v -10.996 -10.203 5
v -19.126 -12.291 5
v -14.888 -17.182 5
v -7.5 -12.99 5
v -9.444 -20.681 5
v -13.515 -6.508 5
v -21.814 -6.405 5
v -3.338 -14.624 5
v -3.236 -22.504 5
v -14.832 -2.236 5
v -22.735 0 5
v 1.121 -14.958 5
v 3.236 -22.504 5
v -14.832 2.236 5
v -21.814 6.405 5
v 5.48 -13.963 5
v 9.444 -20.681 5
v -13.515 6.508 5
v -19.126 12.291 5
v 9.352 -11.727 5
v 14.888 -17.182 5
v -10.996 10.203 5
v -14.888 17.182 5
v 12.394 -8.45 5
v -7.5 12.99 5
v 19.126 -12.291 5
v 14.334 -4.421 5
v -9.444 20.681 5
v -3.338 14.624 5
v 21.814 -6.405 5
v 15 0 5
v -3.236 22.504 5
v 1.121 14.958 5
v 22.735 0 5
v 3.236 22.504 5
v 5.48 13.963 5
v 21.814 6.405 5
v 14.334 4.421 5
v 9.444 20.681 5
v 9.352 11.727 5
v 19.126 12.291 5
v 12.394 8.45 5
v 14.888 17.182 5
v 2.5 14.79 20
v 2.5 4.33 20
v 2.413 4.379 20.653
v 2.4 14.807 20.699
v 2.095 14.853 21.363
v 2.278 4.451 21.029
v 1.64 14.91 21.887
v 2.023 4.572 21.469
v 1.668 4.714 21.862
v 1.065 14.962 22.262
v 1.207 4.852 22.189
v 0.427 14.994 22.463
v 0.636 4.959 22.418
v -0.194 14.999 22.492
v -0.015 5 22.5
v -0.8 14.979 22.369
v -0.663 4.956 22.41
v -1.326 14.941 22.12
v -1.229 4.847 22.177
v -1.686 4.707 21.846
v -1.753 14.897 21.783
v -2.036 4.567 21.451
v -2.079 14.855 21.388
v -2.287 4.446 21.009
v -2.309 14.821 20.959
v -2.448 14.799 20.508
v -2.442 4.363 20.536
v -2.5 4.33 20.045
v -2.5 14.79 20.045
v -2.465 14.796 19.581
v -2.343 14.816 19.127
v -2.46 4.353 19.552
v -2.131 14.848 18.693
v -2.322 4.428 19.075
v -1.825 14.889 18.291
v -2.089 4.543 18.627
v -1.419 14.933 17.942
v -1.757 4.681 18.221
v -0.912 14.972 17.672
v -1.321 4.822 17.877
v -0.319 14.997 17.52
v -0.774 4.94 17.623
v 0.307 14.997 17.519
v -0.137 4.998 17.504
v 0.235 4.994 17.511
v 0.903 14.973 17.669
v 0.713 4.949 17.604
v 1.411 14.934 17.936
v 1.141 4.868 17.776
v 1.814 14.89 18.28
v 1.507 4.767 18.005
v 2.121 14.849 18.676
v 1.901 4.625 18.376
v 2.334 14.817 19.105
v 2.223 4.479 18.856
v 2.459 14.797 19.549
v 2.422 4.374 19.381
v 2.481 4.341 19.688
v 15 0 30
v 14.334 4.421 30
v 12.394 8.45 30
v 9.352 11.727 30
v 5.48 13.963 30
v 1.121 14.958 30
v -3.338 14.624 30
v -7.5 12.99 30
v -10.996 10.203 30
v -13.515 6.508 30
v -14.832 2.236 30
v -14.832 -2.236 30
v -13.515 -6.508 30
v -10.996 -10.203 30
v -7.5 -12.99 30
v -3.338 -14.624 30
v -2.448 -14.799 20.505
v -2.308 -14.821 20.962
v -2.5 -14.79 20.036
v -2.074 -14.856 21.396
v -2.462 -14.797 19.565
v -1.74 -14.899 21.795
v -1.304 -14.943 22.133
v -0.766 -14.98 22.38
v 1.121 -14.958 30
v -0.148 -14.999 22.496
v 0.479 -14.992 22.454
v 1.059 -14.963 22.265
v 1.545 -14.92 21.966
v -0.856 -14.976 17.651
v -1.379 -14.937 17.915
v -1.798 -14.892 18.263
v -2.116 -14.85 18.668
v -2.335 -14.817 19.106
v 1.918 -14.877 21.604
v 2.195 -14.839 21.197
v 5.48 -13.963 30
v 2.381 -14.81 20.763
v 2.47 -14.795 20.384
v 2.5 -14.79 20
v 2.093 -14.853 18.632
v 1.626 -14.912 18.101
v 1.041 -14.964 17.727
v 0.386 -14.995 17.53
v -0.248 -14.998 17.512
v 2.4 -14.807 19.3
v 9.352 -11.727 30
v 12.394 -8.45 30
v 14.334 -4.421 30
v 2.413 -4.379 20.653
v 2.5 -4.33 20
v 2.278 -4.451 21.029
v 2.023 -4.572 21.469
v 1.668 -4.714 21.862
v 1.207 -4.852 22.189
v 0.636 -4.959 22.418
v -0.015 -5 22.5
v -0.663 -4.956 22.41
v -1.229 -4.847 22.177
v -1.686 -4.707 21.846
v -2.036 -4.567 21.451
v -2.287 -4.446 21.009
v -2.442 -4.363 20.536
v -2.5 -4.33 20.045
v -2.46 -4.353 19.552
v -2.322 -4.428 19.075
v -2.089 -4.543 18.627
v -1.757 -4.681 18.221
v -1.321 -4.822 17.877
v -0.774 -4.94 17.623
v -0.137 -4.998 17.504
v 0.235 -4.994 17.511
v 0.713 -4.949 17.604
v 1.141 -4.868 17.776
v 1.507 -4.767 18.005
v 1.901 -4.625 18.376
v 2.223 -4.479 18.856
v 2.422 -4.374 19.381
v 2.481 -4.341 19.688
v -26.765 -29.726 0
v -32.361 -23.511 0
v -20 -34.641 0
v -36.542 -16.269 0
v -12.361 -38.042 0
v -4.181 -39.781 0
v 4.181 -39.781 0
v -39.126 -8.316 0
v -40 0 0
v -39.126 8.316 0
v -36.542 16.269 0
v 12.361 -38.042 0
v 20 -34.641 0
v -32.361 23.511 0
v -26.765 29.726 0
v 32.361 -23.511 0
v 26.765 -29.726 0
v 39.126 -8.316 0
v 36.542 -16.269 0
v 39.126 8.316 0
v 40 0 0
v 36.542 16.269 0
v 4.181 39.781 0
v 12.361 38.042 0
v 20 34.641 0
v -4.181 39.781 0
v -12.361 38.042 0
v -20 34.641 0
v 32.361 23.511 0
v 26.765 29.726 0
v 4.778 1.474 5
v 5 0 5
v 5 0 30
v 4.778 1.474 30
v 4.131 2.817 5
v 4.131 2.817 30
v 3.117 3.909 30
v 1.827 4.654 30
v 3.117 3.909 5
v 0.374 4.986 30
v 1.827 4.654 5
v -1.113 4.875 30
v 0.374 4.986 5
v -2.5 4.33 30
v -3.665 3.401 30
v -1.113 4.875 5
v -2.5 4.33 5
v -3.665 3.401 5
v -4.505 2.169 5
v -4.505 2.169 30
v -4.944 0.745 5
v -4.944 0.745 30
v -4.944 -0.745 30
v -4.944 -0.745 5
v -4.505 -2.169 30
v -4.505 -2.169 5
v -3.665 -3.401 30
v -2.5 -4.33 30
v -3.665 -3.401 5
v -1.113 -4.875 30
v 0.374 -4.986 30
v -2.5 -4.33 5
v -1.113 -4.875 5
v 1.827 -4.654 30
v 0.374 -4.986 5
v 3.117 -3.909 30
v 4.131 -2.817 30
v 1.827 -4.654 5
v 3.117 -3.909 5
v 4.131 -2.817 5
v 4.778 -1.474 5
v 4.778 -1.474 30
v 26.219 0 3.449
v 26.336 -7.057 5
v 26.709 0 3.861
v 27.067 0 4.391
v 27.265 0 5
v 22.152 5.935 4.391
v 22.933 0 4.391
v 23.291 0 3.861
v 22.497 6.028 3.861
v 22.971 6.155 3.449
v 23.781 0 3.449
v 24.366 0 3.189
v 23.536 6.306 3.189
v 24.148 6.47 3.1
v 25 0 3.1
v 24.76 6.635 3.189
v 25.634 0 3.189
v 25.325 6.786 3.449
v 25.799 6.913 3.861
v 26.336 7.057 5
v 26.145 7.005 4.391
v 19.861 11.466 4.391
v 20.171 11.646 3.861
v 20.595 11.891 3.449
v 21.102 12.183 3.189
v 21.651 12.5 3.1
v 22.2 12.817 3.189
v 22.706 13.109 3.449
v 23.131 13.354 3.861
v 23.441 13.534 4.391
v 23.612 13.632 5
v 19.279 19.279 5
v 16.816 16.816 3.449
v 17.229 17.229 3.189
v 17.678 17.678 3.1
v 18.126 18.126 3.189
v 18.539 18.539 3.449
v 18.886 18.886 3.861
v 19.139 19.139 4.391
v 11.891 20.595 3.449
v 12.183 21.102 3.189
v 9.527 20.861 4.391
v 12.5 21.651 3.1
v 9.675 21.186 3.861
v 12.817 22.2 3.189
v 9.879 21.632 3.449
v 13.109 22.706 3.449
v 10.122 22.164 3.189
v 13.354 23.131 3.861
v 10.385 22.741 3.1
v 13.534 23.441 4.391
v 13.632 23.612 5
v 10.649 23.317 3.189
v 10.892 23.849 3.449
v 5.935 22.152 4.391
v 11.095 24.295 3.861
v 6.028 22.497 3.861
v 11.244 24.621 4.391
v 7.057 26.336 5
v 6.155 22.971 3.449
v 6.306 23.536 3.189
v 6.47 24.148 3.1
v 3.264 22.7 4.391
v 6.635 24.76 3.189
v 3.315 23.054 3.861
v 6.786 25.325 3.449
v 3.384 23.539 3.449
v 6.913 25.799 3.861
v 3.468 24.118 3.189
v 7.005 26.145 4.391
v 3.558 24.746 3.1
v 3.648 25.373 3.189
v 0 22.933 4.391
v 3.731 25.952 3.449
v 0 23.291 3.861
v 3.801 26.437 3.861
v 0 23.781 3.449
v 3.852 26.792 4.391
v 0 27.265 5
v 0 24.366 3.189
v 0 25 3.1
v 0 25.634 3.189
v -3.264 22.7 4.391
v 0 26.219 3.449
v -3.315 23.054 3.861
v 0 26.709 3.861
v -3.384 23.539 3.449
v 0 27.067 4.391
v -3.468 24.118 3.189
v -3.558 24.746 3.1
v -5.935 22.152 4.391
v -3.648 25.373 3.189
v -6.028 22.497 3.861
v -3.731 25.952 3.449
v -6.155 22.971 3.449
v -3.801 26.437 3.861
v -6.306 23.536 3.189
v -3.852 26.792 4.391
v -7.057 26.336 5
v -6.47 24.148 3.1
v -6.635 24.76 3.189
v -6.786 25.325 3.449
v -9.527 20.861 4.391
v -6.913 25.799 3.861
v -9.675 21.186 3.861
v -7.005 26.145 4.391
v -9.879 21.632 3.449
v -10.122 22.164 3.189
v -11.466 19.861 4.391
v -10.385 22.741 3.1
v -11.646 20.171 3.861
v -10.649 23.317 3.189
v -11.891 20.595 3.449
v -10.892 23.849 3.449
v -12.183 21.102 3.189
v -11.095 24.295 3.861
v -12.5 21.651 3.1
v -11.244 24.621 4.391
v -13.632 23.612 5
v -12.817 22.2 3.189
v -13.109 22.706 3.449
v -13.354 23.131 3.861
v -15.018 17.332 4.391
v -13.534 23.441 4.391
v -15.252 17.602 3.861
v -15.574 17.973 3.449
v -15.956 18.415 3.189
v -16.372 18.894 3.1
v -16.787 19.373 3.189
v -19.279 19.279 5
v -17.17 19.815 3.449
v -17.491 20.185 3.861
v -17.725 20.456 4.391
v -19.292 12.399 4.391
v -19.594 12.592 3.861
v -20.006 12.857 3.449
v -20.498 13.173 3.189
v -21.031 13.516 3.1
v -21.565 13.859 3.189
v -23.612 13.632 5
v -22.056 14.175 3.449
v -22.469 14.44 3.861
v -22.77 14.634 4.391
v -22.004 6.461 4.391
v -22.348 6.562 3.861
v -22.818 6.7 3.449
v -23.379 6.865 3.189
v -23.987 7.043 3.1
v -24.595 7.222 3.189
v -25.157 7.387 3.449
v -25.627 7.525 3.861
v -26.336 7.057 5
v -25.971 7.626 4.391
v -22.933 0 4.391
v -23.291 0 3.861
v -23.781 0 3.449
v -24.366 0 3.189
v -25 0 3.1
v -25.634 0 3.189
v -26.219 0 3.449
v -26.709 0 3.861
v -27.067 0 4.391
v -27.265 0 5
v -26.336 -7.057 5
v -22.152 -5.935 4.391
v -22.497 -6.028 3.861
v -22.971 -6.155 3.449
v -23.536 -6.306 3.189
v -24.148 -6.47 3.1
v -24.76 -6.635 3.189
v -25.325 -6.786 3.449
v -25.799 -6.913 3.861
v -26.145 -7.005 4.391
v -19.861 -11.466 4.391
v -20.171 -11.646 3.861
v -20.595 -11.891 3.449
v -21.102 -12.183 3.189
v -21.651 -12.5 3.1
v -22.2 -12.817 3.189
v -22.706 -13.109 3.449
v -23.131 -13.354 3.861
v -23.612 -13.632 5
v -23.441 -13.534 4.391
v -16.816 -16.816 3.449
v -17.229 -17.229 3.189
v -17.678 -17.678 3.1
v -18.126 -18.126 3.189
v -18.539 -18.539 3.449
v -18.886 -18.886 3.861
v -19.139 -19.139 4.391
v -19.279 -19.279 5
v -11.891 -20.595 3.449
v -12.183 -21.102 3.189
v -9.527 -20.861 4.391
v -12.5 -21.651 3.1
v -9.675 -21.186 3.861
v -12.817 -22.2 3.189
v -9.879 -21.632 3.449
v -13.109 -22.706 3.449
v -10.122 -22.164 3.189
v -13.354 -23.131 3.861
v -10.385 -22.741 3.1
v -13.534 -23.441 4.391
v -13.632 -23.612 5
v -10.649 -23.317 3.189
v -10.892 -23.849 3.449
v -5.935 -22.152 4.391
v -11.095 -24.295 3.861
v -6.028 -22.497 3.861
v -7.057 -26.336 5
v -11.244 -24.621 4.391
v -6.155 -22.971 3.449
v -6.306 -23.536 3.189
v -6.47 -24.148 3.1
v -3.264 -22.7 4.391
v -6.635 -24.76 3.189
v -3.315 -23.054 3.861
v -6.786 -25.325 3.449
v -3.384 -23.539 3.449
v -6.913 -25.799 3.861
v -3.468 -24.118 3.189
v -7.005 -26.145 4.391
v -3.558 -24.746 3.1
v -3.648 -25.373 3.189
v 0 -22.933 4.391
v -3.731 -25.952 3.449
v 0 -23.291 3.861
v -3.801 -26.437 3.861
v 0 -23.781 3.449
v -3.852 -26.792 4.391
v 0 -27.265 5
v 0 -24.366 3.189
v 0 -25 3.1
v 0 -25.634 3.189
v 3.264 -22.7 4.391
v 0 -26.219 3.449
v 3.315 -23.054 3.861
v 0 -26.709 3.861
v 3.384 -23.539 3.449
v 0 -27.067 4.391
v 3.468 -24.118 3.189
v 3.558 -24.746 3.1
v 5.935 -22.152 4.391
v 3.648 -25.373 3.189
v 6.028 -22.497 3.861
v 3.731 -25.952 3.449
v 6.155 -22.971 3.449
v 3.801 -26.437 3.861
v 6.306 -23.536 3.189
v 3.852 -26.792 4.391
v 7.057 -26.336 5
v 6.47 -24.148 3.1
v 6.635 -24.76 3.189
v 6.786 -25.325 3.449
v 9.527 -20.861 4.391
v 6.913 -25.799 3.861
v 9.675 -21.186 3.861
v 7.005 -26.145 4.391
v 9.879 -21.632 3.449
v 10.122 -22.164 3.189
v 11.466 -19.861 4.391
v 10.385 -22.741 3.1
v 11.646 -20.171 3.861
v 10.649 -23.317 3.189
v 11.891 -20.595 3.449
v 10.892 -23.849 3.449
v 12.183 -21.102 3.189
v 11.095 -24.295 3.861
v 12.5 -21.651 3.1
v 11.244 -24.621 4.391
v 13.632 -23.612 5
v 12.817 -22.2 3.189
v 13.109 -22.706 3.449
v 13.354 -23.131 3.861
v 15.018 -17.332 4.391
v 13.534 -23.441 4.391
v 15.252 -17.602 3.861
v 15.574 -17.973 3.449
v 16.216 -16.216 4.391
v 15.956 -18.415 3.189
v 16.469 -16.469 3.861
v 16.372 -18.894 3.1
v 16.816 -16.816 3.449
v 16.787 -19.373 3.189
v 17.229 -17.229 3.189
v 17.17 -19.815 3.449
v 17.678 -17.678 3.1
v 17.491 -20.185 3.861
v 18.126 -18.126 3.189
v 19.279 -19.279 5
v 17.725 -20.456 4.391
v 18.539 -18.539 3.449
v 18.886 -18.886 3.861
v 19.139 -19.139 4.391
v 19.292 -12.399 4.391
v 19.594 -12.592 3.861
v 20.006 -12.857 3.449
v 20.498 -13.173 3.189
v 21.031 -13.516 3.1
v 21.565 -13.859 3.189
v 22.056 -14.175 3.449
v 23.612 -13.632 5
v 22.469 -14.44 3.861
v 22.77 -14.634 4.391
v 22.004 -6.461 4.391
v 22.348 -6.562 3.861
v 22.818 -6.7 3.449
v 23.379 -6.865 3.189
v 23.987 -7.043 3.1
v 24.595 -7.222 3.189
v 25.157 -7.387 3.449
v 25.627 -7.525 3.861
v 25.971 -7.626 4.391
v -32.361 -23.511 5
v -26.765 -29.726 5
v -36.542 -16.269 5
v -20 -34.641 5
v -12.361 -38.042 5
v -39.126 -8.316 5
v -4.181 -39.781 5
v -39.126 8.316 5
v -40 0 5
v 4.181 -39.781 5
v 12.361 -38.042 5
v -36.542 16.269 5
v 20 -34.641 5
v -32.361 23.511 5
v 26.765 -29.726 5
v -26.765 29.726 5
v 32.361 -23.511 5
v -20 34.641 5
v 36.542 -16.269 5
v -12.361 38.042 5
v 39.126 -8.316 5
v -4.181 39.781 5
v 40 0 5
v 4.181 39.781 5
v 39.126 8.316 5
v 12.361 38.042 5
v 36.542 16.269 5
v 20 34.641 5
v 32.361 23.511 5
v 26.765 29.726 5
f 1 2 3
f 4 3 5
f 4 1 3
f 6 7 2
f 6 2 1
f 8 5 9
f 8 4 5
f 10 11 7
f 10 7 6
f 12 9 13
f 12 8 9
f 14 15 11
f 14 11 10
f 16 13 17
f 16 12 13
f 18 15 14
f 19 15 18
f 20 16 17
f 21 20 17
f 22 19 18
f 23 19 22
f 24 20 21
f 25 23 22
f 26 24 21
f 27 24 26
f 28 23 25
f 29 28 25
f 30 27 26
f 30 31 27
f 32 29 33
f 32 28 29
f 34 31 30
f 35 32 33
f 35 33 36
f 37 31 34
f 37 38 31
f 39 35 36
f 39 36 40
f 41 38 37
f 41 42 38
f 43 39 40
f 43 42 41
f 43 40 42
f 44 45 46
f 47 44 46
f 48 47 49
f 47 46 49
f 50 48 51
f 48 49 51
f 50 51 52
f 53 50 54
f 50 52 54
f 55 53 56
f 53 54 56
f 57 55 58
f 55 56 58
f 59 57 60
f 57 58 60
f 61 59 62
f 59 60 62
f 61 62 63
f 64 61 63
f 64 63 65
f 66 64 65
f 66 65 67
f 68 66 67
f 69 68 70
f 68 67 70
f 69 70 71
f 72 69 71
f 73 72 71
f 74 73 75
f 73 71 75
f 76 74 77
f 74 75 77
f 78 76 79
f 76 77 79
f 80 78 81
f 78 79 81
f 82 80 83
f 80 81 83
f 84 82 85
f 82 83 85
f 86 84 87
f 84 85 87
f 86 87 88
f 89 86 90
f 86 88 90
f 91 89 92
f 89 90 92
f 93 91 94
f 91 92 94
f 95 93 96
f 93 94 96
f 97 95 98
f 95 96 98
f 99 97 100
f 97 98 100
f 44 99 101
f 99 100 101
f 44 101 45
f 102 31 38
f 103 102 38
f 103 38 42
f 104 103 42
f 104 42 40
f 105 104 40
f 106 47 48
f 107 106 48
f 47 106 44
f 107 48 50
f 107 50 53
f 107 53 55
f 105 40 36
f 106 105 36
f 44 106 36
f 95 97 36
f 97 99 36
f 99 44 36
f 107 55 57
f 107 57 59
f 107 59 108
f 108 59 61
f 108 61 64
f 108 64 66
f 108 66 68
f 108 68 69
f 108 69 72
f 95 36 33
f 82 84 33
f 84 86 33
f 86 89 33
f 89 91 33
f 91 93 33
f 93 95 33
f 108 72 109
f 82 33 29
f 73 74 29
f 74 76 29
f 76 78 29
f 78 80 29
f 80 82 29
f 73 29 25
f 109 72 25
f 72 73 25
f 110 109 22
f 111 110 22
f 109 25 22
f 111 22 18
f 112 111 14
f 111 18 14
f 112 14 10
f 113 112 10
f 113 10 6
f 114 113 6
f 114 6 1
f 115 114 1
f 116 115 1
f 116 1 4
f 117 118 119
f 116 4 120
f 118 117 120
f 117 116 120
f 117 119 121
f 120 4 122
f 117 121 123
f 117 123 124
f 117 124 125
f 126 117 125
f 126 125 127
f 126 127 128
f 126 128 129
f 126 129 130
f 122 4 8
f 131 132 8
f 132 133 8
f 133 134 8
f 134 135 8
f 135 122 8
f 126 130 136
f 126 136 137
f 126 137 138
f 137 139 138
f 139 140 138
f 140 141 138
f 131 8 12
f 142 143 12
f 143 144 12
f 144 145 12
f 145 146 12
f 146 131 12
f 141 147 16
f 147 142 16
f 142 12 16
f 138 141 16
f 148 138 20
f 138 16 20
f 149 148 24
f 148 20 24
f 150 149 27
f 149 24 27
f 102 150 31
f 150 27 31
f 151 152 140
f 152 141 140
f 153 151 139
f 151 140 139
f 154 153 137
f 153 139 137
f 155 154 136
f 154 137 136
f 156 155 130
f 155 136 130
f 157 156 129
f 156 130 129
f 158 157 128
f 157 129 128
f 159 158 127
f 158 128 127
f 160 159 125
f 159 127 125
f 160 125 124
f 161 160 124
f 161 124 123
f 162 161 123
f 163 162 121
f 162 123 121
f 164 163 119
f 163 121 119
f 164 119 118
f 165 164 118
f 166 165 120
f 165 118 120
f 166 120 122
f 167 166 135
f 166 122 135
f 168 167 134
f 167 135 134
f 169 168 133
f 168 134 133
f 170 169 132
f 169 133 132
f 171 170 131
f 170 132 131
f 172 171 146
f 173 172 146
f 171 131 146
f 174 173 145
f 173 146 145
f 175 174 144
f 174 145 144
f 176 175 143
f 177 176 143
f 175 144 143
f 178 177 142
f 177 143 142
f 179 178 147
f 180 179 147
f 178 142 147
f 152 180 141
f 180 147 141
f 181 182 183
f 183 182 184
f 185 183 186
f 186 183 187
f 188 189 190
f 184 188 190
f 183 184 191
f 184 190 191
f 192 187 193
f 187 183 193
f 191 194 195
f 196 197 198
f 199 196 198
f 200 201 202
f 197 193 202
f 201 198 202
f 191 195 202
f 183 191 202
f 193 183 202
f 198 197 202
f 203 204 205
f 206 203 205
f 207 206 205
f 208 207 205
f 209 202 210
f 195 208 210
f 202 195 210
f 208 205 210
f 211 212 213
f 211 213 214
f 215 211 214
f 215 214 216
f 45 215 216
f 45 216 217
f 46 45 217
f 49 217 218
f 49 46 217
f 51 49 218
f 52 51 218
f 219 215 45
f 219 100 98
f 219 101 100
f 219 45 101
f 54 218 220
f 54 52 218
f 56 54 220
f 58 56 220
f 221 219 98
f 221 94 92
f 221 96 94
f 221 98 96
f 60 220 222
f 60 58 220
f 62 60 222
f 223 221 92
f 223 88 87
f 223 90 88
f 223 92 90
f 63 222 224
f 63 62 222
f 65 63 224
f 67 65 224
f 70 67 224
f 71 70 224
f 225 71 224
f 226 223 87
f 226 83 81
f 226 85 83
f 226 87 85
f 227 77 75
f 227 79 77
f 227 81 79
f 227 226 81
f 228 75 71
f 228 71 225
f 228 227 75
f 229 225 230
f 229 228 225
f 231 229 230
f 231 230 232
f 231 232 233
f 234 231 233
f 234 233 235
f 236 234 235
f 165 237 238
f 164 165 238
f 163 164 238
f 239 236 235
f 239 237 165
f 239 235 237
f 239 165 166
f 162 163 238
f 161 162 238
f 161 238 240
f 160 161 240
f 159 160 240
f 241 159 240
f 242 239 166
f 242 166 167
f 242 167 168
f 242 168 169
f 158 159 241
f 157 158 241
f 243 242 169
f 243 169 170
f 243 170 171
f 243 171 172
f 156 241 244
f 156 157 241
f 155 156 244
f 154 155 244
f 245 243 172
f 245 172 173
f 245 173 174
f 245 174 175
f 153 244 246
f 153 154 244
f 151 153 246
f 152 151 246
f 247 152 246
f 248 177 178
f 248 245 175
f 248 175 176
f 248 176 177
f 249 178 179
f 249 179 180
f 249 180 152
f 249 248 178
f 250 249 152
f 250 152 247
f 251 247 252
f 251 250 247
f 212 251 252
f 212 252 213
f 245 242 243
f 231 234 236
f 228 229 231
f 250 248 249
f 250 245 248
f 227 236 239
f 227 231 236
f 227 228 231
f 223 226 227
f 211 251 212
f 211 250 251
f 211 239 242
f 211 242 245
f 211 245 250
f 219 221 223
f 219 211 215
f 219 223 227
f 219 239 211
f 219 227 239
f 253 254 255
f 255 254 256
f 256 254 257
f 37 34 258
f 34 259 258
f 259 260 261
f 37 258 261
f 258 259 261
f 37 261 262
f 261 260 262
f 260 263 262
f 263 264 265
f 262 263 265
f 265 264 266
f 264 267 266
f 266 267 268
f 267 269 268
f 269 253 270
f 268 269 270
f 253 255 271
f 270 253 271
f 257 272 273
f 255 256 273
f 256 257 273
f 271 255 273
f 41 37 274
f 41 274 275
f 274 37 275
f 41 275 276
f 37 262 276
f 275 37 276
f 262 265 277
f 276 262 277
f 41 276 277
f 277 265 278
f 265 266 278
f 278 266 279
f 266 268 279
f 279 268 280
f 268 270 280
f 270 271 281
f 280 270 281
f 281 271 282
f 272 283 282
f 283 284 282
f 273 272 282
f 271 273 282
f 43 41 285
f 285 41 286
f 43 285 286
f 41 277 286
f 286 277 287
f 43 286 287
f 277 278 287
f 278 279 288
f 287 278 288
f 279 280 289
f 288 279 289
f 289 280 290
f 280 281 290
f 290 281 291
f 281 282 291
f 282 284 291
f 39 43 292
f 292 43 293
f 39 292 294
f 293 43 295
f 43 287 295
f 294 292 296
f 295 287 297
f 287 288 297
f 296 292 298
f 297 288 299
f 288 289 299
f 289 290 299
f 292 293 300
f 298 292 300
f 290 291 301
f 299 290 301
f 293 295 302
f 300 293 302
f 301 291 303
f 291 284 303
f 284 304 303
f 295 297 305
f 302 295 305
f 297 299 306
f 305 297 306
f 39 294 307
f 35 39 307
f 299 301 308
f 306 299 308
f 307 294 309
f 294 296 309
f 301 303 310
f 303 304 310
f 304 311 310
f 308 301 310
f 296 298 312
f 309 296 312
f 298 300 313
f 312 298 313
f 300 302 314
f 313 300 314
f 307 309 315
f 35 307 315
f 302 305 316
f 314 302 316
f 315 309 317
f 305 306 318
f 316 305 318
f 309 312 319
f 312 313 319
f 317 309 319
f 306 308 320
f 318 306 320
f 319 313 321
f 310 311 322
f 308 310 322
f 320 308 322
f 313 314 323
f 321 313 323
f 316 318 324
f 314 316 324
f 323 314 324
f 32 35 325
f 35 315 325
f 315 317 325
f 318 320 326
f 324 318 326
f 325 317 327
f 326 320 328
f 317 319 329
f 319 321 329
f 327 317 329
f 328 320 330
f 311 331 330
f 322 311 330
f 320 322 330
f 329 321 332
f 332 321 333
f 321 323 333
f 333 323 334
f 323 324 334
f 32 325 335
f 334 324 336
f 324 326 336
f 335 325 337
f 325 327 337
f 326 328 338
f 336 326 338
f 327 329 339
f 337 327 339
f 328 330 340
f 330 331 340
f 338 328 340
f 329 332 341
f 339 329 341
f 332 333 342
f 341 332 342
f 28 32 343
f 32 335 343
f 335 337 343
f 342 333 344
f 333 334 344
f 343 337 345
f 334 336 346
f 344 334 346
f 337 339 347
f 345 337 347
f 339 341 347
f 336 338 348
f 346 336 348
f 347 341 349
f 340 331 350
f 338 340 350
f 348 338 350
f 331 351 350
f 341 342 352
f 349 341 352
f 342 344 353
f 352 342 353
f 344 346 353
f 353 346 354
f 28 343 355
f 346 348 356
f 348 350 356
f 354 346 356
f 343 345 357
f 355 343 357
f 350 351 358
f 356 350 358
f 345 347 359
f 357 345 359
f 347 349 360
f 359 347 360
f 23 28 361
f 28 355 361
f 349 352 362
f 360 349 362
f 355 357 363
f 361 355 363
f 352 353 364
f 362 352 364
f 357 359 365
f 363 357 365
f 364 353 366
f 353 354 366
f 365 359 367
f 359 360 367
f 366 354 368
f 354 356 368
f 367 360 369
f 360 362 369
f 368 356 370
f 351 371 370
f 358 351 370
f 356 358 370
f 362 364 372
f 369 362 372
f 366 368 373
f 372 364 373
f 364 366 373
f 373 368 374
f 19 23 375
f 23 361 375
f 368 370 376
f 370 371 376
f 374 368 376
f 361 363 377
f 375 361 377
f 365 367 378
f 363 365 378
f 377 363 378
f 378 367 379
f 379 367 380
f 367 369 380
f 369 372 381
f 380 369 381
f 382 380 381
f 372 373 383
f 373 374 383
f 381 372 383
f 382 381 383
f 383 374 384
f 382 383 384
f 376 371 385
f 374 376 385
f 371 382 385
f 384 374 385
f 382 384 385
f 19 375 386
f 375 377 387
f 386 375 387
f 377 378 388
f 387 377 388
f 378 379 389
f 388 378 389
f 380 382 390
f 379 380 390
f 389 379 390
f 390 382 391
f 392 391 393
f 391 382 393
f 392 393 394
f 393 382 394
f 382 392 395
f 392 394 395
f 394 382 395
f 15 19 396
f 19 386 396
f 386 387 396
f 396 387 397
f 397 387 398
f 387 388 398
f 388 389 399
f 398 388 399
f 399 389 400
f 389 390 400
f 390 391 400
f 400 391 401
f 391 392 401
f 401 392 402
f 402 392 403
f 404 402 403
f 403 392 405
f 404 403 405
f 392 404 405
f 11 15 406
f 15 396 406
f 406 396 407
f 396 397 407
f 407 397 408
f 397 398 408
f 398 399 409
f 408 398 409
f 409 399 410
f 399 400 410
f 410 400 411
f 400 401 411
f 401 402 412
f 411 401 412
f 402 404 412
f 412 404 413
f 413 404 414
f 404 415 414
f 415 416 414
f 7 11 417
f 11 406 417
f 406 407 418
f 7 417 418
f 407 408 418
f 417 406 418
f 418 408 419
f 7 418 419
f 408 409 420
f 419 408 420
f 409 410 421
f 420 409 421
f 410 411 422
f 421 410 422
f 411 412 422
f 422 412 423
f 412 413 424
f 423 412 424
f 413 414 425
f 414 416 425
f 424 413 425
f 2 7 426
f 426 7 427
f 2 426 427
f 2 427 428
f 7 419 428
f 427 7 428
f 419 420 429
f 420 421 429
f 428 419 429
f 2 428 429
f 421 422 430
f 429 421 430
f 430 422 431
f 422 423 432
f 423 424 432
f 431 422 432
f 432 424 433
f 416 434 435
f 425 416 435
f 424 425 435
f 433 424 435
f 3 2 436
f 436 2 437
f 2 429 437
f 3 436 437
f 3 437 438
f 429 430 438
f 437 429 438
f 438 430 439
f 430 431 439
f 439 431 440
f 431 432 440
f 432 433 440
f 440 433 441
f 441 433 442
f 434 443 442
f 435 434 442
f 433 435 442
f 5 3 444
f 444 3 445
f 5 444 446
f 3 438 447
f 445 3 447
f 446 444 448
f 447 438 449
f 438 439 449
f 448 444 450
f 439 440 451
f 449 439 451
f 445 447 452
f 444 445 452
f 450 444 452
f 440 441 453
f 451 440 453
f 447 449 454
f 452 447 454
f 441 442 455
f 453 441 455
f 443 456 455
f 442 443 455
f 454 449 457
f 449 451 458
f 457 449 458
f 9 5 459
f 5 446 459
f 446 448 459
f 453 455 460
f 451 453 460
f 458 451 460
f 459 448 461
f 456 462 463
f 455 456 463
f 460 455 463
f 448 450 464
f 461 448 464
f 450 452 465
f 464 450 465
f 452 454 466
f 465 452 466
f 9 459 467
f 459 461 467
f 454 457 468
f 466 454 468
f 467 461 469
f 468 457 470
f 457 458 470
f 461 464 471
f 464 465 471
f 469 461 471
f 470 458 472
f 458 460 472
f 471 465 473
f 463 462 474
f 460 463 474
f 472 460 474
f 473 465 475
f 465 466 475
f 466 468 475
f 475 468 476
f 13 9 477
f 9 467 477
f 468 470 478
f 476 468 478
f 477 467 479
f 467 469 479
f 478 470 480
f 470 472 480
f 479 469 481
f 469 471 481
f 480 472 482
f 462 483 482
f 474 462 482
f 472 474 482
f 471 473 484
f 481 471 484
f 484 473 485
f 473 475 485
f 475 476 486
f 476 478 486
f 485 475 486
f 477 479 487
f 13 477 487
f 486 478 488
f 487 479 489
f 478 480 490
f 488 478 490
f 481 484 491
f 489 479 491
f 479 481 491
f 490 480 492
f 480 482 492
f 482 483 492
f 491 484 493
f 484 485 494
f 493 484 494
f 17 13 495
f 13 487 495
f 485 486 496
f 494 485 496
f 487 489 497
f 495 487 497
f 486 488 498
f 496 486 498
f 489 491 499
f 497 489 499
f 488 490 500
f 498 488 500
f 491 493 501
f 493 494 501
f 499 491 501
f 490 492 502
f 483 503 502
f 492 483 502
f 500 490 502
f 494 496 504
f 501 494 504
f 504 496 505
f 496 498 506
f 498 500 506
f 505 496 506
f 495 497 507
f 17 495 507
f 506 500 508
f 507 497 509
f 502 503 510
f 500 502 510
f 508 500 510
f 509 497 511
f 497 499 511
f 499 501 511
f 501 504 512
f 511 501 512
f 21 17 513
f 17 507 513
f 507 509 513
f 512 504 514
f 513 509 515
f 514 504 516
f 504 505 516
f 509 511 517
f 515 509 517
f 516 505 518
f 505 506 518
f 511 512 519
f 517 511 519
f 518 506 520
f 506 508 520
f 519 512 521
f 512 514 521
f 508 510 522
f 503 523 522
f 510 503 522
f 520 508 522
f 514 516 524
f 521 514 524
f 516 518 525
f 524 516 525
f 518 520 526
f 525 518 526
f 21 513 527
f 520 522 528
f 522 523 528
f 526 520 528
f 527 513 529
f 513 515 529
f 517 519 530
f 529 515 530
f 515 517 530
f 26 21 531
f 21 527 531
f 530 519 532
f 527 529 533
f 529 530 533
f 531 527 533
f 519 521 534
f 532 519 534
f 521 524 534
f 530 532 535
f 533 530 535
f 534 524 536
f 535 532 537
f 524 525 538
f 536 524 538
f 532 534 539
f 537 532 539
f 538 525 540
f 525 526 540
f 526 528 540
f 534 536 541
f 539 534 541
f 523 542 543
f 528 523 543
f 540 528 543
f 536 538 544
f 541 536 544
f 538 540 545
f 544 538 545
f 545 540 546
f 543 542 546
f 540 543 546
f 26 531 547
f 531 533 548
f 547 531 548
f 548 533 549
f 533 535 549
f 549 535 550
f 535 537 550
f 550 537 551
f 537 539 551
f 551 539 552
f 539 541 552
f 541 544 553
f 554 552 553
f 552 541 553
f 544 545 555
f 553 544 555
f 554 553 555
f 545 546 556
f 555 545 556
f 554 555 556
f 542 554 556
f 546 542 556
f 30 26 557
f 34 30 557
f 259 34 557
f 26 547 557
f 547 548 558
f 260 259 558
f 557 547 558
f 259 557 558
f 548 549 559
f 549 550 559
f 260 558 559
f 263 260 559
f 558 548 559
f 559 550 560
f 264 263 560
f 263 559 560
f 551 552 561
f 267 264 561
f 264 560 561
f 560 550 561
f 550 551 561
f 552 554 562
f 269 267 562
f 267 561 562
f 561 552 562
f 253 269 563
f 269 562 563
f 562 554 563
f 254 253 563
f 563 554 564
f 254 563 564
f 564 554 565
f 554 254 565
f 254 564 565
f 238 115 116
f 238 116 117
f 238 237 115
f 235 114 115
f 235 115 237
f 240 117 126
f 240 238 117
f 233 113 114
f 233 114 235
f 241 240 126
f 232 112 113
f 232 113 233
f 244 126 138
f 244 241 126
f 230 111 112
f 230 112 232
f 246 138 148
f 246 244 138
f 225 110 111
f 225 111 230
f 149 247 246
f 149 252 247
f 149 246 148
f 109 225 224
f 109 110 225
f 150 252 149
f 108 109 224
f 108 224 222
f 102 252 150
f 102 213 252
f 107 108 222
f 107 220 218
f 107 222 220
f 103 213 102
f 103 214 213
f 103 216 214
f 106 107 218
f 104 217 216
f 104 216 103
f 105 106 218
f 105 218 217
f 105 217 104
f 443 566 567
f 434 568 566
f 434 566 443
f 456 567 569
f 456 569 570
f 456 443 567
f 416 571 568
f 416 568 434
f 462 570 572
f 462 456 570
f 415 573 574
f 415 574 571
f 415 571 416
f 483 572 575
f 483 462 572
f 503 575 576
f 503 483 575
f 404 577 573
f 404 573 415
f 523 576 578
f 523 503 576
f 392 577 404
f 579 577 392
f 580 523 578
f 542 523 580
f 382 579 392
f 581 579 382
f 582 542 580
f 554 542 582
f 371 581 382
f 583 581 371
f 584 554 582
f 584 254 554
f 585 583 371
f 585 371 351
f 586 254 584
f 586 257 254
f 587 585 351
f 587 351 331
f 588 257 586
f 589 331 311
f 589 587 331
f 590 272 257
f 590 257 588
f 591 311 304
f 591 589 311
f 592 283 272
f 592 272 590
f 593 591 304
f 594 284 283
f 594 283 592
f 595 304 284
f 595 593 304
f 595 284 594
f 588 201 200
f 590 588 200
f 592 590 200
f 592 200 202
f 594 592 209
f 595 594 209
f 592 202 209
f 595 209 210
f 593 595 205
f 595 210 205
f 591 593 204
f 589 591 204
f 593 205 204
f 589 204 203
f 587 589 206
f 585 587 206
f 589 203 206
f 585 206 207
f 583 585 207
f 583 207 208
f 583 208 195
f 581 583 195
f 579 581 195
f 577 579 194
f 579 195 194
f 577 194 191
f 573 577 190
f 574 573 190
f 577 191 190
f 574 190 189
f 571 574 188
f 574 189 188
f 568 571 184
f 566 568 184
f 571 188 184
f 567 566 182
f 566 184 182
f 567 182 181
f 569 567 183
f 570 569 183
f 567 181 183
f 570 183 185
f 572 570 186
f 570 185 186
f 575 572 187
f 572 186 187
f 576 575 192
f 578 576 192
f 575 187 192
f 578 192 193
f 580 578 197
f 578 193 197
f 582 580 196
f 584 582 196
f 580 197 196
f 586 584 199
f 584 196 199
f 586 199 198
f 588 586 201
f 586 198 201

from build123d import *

# Parameters (mm, degrees)
SKETCH003_R  = 5
PAD002_DEPTH = 30
SKETCH004_R  = 2.5
PAD003_DEPTH = 15
SKETCH002_R  = 15
PAD001_DEPTH = 30
SKETCH001_R  = 2.3
SKETCH_R     = 40
PAD_DEPTH    = 5


with BuildPart() as pad002:
    # Sketch003 → Pad002 (new body)
    with BuildSketch(Plane.XY):
        Circle(SKETCH003_R)
    extrude(amount=PAD002_DEPTH)


with BuildPart() as pad003:
    # Sketch004 → Pad003 (new body, symmetric)
    with BuildSketch(Plane.XZ):
        with Locations((0, 20)):
            Circle(SKETCH004_R)
    extrude(amount=PAD003_DEPTH, both=True)


with BuildPart() as post:
    # Sketch002 → Pad001 (new body)
    with BuildSketch(Plane.XY):
        Circle(SKETCH002_R)
    extrude(amount=PAD001_DEPTH)

    # Cut002: cut Pad003
    add(pad003.part, mode=Mode.SUBTRACT)

    # Cut003: cut Pad002
    add(pad002.part, mode=Mode.SUBTRACT)


with BuildPart() as revolution:
    # Sketch001 → Revolution (revolve)
    with BuildSketch(Plane.XZ):
        with Locations((25, 5.4)):
            Circle(SKETCH001_R)
    revolve(axis=Axis((0, 0, 0), (0, 0, 1)))


with BuildPart() as fusion:
    # Sketch → Pad (new body)
    with BuildSketch(Plane.XY):
        Circle(SKETCH_R)
    extrude(amount=PAD_DEPTH)

    # Cut: cut Revolution
    add(revolution.part, mode=Mode.SUBTRACT)

    # Fusion: union post
    add(post.part)


solid = fusion.part
